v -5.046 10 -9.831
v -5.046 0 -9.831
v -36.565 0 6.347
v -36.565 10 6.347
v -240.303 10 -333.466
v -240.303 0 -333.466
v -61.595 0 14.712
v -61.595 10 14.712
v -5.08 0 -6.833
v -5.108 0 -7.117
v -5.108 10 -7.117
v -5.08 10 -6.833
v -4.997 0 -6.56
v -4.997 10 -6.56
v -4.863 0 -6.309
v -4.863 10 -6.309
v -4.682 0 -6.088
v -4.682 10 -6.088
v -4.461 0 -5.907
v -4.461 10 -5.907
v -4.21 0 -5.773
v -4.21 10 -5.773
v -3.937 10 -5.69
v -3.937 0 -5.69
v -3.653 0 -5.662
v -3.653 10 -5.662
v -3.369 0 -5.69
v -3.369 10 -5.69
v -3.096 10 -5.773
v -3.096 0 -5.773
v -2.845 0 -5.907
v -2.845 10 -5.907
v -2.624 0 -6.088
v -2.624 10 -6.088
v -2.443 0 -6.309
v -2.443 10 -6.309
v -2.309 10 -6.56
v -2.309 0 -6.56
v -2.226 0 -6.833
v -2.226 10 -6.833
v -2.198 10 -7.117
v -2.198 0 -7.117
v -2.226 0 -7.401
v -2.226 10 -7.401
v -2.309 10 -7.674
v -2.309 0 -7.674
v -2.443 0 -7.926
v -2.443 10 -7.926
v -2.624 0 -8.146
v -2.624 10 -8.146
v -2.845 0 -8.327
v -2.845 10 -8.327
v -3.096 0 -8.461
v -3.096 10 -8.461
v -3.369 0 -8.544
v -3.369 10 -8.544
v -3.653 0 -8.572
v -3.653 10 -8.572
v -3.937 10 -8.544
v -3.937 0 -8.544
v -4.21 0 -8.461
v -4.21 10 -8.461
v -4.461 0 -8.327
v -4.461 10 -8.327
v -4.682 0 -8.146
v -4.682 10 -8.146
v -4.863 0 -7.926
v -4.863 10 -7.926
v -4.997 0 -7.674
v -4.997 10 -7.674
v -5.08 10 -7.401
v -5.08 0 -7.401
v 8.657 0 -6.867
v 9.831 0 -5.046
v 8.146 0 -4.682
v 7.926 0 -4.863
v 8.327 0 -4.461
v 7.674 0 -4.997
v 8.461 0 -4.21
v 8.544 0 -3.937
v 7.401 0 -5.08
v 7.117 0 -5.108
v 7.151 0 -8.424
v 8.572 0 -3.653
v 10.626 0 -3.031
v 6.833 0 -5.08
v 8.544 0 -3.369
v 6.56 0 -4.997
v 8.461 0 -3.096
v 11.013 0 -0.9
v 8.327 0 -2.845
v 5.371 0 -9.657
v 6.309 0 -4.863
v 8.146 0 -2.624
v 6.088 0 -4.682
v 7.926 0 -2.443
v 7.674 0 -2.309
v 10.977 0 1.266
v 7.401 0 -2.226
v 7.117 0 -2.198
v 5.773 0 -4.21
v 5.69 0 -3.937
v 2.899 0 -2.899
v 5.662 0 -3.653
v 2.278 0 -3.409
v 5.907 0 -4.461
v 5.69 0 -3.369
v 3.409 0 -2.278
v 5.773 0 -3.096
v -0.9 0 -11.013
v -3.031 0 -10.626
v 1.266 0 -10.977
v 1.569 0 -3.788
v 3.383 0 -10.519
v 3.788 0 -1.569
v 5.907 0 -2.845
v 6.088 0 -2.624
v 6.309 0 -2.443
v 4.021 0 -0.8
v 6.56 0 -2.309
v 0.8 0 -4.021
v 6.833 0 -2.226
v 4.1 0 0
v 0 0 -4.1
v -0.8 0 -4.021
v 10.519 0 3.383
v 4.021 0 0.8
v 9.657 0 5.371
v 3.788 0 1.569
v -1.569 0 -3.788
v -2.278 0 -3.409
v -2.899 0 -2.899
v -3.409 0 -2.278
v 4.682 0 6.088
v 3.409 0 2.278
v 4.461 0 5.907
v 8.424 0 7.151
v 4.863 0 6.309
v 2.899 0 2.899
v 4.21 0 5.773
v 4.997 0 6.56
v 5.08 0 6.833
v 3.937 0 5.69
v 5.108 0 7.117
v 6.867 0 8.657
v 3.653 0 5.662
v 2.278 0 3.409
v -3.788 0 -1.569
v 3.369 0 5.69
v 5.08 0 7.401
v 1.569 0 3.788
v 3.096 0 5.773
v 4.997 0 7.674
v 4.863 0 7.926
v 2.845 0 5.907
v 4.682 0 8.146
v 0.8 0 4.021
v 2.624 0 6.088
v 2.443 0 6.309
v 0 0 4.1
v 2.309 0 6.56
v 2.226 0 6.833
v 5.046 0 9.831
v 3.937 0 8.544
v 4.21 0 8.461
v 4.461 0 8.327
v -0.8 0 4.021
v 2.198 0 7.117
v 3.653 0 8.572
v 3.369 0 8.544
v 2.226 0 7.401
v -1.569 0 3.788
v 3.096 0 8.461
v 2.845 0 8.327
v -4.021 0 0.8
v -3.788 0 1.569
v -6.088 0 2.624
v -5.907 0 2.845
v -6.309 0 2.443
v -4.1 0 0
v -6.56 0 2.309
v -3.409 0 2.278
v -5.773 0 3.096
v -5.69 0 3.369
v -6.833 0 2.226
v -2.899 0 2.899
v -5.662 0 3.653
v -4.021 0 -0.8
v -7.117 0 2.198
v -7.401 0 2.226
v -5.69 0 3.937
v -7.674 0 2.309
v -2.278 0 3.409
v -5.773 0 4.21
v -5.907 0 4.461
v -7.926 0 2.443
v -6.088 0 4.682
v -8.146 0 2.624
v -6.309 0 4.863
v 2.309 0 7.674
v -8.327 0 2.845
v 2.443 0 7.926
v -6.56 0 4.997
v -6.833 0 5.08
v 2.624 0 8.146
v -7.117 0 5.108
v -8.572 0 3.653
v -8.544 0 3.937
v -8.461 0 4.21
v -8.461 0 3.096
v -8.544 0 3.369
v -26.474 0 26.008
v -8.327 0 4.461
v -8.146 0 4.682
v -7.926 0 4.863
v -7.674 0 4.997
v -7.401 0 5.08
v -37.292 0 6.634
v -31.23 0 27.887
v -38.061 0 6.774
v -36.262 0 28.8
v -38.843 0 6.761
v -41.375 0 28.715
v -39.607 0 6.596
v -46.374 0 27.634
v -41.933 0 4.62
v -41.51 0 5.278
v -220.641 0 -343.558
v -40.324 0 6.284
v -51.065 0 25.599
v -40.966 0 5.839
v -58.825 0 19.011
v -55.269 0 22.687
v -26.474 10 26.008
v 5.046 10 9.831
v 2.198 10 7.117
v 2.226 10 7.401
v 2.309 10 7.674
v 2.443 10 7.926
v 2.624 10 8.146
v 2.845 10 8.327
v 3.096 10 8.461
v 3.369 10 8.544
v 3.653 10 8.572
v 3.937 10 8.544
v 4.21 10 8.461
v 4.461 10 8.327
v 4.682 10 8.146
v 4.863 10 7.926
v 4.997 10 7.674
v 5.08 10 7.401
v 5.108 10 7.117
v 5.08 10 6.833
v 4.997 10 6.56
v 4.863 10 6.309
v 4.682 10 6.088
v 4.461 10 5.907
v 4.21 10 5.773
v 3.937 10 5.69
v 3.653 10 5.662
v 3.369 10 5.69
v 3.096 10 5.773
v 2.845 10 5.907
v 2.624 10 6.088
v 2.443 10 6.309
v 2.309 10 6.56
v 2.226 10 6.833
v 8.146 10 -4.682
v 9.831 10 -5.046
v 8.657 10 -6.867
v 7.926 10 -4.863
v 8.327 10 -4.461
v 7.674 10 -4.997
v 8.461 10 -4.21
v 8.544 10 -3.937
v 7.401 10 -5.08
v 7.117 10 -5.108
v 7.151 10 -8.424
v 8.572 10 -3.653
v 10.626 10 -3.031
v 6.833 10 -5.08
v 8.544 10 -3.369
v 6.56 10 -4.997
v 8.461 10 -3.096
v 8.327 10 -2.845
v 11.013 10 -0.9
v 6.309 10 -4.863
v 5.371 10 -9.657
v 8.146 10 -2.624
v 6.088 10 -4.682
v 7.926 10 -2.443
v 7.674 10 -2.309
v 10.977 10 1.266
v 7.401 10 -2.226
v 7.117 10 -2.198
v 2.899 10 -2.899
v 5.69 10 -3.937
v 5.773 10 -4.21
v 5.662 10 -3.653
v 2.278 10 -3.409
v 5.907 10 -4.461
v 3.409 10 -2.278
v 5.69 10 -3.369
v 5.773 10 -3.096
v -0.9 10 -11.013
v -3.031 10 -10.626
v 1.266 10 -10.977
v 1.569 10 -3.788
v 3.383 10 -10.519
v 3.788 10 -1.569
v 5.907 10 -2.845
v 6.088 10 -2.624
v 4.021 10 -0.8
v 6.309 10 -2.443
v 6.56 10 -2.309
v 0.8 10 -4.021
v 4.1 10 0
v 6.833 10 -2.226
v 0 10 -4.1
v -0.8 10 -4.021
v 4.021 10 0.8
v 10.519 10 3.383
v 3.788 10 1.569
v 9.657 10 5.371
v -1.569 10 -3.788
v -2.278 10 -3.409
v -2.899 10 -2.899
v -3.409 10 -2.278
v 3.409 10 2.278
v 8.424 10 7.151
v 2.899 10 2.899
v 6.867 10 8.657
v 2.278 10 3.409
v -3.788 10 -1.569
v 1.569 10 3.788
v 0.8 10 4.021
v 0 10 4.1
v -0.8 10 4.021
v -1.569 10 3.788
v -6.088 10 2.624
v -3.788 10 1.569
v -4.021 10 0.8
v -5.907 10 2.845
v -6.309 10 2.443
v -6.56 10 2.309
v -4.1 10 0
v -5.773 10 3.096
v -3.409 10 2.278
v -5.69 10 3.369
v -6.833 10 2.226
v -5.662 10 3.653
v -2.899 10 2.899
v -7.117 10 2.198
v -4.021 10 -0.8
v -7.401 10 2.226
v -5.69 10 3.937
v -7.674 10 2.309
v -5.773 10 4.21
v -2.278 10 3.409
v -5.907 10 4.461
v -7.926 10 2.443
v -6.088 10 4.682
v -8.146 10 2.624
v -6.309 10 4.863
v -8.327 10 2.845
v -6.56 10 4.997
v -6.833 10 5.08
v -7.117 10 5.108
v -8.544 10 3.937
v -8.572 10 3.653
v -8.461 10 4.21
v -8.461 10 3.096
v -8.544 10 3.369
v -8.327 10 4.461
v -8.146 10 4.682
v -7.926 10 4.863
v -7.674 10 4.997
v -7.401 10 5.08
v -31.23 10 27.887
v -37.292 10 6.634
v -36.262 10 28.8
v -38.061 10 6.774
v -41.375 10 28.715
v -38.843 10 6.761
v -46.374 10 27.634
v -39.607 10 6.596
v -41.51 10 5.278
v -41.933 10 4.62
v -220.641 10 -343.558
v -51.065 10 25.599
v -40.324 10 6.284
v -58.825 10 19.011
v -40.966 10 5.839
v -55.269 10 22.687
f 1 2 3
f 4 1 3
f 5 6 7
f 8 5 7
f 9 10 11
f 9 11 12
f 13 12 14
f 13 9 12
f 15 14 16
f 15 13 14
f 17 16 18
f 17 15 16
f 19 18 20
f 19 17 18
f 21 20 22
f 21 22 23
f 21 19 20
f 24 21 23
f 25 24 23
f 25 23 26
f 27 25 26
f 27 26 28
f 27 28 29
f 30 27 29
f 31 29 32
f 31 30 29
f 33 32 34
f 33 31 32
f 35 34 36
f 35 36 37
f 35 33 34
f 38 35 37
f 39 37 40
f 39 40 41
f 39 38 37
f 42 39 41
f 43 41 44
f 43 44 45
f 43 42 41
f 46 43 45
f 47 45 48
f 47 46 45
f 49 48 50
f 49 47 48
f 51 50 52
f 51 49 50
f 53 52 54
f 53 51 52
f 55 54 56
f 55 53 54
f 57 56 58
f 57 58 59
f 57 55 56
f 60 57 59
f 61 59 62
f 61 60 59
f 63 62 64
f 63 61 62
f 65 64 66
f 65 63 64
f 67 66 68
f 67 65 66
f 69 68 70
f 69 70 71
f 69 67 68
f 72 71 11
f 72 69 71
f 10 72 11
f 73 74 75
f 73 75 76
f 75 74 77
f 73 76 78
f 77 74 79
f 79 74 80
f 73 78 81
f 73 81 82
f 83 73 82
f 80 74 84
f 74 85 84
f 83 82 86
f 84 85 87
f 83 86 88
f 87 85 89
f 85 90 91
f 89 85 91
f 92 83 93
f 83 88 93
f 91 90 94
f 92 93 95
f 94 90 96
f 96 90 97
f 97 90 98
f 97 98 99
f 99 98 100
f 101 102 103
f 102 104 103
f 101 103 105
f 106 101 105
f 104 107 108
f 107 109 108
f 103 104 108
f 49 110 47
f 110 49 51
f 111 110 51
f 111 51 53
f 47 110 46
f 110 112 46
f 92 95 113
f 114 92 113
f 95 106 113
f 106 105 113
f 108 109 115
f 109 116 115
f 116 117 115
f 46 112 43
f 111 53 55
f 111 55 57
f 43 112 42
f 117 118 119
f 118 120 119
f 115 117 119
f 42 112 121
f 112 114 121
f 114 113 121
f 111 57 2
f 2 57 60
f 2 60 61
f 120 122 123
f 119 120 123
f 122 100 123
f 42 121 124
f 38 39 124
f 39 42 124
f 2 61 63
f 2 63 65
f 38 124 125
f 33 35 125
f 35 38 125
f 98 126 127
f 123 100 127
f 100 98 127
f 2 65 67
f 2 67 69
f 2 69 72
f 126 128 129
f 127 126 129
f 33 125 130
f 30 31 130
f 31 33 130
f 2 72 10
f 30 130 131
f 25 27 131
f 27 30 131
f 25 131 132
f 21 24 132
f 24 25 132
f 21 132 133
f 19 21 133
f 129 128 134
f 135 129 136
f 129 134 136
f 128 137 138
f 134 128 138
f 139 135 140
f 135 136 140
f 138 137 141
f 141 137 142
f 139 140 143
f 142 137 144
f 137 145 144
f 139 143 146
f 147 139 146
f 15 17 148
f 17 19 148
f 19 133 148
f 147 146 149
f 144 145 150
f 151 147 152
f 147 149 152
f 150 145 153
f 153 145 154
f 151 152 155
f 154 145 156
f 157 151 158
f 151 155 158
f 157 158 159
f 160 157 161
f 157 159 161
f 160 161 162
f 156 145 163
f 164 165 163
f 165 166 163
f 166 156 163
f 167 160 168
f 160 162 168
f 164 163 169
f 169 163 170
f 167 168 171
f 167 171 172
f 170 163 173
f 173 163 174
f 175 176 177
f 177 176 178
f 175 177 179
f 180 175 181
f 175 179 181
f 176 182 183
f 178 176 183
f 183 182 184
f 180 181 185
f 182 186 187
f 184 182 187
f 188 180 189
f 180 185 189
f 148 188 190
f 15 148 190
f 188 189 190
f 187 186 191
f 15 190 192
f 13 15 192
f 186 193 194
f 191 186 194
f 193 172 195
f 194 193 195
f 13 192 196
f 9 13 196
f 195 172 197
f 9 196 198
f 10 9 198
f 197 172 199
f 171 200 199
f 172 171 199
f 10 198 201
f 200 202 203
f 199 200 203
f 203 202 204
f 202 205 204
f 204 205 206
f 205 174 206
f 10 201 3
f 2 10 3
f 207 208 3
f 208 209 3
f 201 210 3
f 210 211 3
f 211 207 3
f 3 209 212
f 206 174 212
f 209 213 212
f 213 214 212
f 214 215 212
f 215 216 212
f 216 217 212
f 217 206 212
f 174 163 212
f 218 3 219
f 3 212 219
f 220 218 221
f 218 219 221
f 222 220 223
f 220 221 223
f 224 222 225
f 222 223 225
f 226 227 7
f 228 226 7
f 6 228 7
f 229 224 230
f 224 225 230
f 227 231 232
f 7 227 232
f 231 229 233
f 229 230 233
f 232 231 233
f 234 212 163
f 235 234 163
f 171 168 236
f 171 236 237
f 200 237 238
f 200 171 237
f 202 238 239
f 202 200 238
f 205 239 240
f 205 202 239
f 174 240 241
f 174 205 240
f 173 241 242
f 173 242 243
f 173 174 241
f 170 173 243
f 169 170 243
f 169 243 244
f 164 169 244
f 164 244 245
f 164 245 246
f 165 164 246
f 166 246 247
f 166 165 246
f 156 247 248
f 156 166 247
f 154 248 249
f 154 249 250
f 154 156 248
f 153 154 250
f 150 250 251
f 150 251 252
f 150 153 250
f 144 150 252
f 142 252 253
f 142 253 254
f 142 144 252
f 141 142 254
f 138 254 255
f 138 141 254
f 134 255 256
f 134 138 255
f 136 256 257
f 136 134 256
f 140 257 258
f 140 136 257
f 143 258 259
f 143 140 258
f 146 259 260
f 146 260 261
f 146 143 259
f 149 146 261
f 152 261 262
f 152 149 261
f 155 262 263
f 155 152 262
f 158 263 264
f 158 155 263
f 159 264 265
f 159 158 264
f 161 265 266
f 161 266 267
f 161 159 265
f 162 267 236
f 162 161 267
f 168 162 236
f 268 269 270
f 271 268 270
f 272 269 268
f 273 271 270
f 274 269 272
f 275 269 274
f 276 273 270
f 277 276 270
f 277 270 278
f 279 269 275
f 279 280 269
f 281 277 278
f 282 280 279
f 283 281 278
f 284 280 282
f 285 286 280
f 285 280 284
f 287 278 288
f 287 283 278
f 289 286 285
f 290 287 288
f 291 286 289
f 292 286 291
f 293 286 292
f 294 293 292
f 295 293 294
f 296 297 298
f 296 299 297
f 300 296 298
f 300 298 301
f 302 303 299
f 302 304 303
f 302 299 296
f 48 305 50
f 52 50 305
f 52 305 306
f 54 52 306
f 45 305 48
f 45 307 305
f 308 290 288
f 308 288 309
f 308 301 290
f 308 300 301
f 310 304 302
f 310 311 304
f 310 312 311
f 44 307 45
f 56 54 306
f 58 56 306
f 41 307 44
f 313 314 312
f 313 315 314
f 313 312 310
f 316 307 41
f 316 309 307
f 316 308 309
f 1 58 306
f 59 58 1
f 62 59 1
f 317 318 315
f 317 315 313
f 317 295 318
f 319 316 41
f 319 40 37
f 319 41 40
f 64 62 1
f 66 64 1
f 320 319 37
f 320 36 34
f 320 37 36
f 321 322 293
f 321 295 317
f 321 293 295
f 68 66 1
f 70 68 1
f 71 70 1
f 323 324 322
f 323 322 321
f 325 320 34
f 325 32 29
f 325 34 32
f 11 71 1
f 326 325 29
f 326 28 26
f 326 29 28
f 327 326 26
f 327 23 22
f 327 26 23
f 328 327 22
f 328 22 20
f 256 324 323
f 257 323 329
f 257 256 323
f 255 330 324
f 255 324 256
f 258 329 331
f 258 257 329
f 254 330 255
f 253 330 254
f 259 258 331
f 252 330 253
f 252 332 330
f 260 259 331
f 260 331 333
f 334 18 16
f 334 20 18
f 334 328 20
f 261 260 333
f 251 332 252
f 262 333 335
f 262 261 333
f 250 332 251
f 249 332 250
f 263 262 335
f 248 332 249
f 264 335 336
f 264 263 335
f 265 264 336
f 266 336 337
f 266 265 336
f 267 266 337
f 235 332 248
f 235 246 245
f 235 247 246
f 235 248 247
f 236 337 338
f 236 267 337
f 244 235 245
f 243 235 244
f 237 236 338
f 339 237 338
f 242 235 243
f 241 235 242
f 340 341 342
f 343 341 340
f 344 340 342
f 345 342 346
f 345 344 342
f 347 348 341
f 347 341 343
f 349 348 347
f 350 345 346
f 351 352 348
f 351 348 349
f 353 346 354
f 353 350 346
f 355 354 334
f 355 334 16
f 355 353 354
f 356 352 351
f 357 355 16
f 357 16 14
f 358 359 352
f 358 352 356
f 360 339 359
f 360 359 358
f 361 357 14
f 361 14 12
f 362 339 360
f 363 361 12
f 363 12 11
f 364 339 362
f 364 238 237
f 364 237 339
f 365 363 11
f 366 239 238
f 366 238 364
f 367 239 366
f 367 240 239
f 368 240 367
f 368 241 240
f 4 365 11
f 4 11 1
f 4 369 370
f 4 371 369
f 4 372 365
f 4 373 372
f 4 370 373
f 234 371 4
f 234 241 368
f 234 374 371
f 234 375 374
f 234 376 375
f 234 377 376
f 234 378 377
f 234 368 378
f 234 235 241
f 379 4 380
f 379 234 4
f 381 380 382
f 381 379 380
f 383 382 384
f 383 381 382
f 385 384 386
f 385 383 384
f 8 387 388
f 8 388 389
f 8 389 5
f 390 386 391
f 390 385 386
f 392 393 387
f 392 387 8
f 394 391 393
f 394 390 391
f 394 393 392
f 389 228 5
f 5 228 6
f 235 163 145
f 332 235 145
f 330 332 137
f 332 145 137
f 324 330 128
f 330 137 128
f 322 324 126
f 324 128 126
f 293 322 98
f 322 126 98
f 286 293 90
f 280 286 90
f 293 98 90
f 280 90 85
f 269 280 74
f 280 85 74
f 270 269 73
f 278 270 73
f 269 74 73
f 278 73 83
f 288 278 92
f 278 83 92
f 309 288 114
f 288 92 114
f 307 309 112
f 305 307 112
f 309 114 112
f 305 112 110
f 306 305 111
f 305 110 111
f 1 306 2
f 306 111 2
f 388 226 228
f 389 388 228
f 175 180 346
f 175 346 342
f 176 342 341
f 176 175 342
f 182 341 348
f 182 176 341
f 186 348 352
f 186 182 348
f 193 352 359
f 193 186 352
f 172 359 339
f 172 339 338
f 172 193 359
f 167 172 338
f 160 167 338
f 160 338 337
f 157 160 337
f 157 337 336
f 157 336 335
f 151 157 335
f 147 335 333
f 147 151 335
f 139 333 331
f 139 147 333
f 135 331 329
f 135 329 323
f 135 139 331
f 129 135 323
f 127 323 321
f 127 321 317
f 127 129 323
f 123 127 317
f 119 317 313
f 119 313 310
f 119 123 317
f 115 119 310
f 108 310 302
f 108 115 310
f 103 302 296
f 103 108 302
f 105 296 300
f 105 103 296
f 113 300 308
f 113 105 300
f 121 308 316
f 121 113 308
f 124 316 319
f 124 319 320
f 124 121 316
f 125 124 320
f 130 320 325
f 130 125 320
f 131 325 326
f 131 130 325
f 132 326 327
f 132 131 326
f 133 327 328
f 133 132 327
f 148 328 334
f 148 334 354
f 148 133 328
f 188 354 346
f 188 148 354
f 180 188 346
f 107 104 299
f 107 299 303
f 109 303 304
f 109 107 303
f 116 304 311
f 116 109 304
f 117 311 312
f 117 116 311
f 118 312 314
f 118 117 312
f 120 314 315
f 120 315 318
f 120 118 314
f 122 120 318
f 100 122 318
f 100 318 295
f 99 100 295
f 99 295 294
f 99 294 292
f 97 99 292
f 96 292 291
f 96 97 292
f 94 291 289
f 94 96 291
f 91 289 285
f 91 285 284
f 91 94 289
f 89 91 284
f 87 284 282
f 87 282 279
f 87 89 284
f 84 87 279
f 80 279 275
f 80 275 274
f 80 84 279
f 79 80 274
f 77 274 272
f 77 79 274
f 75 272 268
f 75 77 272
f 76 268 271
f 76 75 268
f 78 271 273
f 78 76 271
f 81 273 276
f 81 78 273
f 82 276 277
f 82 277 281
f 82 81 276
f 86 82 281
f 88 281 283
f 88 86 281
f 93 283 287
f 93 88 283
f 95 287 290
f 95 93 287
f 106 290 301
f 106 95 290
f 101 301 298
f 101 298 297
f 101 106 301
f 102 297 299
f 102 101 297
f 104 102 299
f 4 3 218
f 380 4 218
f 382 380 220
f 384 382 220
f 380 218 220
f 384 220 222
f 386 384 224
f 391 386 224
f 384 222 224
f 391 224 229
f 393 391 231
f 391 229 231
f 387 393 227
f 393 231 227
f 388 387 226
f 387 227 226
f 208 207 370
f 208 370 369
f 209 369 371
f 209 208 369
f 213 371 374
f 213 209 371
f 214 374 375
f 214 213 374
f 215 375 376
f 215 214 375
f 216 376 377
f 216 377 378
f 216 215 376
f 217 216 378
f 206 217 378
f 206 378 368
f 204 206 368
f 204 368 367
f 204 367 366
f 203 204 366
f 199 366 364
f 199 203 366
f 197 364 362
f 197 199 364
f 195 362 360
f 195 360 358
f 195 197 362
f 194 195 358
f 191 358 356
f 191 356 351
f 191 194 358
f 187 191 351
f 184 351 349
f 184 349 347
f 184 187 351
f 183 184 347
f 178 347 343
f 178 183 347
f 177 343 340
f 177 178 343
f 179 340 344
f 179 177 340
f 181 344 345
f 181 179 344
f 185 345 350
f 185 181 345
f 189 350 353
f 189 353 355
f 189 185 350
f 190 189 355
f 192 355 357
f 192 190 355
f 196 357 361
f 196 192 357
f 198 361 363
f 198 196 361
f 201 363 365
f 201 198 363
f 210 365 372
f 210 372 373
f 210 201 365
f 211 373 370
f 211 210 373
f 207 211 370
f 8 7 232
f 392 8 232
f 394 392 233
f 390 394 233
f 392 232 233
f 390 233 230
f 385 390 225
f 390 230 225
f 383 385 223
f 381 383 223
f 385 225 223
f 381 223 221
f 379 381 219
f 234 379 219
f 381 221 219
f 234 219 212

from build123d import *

# Parameters (mm, degrees)
SKETCH2_R           = 4.1
SKETCH2_R_2         = 1.455
BOSS_EXTRUDE2_DEPTH = 10


with BuildPart() as part:
    # Sketch2 → Boss-Extrude2 (new body)
    with BuildSketch(Plane(origin=(0, 0, 0), x_dir=(-1, 0, 0), z_dir=(0, 1, 0))):
        with BuildLine():
            Line((5.045766375, -9.830704028), (36.565058692, 6.347077836))
            ThreePointArc((36.565058692, 6.347077836), (39.606684002, 6.595535729), (41.933124145, 4.620468108))
            Line((41.933124145, 4.620468108), (220.6412412, -343.557880956))
            Line((220.6412412, -343.557880956), (240.302649257, -333.466348206))
            Line((240.302649257, -333.466348206), (61.594532201, 14.712000858))
            ThreePointArc((61.594532201, 14.712000858), (46.373607726, 27.634041934), (26.473525942, 26.008485892))
            Line((26.473525942, 26.008485892), (-5.045766375, 9.830704028))
            ThreePointArc((-5.045766375, 9.830704028), (-9.830704028, -5.045766375), (5.045766375, -9.830704028))
        make_face()
        Circle(SKETCH2_R, mode=Mode.SUBTRACT)
        with Locations((-3.653043529, 7.117251785)):
            Circle(SKETCH2_R_2, mode=Mode.SUBTRACT)
        with Locations((7.117251785, 3.653043529)):
            Circle(SKETCH2_R_2, mode=Mode.SUBTRACT)
        with Locations((-7.117251785, -3.653043529)):
            Circle(SKETCH2_R_2, mode=Mode.SUBTRACT)
        with Locations((3.653043529, -7.117251785)):
            Circle(SKETCH2_R_2, mode=Mode.SUBTRACT)
    extrude(amount=BOSS_EXTRUDE2_DEPTH)


solid = part.part
